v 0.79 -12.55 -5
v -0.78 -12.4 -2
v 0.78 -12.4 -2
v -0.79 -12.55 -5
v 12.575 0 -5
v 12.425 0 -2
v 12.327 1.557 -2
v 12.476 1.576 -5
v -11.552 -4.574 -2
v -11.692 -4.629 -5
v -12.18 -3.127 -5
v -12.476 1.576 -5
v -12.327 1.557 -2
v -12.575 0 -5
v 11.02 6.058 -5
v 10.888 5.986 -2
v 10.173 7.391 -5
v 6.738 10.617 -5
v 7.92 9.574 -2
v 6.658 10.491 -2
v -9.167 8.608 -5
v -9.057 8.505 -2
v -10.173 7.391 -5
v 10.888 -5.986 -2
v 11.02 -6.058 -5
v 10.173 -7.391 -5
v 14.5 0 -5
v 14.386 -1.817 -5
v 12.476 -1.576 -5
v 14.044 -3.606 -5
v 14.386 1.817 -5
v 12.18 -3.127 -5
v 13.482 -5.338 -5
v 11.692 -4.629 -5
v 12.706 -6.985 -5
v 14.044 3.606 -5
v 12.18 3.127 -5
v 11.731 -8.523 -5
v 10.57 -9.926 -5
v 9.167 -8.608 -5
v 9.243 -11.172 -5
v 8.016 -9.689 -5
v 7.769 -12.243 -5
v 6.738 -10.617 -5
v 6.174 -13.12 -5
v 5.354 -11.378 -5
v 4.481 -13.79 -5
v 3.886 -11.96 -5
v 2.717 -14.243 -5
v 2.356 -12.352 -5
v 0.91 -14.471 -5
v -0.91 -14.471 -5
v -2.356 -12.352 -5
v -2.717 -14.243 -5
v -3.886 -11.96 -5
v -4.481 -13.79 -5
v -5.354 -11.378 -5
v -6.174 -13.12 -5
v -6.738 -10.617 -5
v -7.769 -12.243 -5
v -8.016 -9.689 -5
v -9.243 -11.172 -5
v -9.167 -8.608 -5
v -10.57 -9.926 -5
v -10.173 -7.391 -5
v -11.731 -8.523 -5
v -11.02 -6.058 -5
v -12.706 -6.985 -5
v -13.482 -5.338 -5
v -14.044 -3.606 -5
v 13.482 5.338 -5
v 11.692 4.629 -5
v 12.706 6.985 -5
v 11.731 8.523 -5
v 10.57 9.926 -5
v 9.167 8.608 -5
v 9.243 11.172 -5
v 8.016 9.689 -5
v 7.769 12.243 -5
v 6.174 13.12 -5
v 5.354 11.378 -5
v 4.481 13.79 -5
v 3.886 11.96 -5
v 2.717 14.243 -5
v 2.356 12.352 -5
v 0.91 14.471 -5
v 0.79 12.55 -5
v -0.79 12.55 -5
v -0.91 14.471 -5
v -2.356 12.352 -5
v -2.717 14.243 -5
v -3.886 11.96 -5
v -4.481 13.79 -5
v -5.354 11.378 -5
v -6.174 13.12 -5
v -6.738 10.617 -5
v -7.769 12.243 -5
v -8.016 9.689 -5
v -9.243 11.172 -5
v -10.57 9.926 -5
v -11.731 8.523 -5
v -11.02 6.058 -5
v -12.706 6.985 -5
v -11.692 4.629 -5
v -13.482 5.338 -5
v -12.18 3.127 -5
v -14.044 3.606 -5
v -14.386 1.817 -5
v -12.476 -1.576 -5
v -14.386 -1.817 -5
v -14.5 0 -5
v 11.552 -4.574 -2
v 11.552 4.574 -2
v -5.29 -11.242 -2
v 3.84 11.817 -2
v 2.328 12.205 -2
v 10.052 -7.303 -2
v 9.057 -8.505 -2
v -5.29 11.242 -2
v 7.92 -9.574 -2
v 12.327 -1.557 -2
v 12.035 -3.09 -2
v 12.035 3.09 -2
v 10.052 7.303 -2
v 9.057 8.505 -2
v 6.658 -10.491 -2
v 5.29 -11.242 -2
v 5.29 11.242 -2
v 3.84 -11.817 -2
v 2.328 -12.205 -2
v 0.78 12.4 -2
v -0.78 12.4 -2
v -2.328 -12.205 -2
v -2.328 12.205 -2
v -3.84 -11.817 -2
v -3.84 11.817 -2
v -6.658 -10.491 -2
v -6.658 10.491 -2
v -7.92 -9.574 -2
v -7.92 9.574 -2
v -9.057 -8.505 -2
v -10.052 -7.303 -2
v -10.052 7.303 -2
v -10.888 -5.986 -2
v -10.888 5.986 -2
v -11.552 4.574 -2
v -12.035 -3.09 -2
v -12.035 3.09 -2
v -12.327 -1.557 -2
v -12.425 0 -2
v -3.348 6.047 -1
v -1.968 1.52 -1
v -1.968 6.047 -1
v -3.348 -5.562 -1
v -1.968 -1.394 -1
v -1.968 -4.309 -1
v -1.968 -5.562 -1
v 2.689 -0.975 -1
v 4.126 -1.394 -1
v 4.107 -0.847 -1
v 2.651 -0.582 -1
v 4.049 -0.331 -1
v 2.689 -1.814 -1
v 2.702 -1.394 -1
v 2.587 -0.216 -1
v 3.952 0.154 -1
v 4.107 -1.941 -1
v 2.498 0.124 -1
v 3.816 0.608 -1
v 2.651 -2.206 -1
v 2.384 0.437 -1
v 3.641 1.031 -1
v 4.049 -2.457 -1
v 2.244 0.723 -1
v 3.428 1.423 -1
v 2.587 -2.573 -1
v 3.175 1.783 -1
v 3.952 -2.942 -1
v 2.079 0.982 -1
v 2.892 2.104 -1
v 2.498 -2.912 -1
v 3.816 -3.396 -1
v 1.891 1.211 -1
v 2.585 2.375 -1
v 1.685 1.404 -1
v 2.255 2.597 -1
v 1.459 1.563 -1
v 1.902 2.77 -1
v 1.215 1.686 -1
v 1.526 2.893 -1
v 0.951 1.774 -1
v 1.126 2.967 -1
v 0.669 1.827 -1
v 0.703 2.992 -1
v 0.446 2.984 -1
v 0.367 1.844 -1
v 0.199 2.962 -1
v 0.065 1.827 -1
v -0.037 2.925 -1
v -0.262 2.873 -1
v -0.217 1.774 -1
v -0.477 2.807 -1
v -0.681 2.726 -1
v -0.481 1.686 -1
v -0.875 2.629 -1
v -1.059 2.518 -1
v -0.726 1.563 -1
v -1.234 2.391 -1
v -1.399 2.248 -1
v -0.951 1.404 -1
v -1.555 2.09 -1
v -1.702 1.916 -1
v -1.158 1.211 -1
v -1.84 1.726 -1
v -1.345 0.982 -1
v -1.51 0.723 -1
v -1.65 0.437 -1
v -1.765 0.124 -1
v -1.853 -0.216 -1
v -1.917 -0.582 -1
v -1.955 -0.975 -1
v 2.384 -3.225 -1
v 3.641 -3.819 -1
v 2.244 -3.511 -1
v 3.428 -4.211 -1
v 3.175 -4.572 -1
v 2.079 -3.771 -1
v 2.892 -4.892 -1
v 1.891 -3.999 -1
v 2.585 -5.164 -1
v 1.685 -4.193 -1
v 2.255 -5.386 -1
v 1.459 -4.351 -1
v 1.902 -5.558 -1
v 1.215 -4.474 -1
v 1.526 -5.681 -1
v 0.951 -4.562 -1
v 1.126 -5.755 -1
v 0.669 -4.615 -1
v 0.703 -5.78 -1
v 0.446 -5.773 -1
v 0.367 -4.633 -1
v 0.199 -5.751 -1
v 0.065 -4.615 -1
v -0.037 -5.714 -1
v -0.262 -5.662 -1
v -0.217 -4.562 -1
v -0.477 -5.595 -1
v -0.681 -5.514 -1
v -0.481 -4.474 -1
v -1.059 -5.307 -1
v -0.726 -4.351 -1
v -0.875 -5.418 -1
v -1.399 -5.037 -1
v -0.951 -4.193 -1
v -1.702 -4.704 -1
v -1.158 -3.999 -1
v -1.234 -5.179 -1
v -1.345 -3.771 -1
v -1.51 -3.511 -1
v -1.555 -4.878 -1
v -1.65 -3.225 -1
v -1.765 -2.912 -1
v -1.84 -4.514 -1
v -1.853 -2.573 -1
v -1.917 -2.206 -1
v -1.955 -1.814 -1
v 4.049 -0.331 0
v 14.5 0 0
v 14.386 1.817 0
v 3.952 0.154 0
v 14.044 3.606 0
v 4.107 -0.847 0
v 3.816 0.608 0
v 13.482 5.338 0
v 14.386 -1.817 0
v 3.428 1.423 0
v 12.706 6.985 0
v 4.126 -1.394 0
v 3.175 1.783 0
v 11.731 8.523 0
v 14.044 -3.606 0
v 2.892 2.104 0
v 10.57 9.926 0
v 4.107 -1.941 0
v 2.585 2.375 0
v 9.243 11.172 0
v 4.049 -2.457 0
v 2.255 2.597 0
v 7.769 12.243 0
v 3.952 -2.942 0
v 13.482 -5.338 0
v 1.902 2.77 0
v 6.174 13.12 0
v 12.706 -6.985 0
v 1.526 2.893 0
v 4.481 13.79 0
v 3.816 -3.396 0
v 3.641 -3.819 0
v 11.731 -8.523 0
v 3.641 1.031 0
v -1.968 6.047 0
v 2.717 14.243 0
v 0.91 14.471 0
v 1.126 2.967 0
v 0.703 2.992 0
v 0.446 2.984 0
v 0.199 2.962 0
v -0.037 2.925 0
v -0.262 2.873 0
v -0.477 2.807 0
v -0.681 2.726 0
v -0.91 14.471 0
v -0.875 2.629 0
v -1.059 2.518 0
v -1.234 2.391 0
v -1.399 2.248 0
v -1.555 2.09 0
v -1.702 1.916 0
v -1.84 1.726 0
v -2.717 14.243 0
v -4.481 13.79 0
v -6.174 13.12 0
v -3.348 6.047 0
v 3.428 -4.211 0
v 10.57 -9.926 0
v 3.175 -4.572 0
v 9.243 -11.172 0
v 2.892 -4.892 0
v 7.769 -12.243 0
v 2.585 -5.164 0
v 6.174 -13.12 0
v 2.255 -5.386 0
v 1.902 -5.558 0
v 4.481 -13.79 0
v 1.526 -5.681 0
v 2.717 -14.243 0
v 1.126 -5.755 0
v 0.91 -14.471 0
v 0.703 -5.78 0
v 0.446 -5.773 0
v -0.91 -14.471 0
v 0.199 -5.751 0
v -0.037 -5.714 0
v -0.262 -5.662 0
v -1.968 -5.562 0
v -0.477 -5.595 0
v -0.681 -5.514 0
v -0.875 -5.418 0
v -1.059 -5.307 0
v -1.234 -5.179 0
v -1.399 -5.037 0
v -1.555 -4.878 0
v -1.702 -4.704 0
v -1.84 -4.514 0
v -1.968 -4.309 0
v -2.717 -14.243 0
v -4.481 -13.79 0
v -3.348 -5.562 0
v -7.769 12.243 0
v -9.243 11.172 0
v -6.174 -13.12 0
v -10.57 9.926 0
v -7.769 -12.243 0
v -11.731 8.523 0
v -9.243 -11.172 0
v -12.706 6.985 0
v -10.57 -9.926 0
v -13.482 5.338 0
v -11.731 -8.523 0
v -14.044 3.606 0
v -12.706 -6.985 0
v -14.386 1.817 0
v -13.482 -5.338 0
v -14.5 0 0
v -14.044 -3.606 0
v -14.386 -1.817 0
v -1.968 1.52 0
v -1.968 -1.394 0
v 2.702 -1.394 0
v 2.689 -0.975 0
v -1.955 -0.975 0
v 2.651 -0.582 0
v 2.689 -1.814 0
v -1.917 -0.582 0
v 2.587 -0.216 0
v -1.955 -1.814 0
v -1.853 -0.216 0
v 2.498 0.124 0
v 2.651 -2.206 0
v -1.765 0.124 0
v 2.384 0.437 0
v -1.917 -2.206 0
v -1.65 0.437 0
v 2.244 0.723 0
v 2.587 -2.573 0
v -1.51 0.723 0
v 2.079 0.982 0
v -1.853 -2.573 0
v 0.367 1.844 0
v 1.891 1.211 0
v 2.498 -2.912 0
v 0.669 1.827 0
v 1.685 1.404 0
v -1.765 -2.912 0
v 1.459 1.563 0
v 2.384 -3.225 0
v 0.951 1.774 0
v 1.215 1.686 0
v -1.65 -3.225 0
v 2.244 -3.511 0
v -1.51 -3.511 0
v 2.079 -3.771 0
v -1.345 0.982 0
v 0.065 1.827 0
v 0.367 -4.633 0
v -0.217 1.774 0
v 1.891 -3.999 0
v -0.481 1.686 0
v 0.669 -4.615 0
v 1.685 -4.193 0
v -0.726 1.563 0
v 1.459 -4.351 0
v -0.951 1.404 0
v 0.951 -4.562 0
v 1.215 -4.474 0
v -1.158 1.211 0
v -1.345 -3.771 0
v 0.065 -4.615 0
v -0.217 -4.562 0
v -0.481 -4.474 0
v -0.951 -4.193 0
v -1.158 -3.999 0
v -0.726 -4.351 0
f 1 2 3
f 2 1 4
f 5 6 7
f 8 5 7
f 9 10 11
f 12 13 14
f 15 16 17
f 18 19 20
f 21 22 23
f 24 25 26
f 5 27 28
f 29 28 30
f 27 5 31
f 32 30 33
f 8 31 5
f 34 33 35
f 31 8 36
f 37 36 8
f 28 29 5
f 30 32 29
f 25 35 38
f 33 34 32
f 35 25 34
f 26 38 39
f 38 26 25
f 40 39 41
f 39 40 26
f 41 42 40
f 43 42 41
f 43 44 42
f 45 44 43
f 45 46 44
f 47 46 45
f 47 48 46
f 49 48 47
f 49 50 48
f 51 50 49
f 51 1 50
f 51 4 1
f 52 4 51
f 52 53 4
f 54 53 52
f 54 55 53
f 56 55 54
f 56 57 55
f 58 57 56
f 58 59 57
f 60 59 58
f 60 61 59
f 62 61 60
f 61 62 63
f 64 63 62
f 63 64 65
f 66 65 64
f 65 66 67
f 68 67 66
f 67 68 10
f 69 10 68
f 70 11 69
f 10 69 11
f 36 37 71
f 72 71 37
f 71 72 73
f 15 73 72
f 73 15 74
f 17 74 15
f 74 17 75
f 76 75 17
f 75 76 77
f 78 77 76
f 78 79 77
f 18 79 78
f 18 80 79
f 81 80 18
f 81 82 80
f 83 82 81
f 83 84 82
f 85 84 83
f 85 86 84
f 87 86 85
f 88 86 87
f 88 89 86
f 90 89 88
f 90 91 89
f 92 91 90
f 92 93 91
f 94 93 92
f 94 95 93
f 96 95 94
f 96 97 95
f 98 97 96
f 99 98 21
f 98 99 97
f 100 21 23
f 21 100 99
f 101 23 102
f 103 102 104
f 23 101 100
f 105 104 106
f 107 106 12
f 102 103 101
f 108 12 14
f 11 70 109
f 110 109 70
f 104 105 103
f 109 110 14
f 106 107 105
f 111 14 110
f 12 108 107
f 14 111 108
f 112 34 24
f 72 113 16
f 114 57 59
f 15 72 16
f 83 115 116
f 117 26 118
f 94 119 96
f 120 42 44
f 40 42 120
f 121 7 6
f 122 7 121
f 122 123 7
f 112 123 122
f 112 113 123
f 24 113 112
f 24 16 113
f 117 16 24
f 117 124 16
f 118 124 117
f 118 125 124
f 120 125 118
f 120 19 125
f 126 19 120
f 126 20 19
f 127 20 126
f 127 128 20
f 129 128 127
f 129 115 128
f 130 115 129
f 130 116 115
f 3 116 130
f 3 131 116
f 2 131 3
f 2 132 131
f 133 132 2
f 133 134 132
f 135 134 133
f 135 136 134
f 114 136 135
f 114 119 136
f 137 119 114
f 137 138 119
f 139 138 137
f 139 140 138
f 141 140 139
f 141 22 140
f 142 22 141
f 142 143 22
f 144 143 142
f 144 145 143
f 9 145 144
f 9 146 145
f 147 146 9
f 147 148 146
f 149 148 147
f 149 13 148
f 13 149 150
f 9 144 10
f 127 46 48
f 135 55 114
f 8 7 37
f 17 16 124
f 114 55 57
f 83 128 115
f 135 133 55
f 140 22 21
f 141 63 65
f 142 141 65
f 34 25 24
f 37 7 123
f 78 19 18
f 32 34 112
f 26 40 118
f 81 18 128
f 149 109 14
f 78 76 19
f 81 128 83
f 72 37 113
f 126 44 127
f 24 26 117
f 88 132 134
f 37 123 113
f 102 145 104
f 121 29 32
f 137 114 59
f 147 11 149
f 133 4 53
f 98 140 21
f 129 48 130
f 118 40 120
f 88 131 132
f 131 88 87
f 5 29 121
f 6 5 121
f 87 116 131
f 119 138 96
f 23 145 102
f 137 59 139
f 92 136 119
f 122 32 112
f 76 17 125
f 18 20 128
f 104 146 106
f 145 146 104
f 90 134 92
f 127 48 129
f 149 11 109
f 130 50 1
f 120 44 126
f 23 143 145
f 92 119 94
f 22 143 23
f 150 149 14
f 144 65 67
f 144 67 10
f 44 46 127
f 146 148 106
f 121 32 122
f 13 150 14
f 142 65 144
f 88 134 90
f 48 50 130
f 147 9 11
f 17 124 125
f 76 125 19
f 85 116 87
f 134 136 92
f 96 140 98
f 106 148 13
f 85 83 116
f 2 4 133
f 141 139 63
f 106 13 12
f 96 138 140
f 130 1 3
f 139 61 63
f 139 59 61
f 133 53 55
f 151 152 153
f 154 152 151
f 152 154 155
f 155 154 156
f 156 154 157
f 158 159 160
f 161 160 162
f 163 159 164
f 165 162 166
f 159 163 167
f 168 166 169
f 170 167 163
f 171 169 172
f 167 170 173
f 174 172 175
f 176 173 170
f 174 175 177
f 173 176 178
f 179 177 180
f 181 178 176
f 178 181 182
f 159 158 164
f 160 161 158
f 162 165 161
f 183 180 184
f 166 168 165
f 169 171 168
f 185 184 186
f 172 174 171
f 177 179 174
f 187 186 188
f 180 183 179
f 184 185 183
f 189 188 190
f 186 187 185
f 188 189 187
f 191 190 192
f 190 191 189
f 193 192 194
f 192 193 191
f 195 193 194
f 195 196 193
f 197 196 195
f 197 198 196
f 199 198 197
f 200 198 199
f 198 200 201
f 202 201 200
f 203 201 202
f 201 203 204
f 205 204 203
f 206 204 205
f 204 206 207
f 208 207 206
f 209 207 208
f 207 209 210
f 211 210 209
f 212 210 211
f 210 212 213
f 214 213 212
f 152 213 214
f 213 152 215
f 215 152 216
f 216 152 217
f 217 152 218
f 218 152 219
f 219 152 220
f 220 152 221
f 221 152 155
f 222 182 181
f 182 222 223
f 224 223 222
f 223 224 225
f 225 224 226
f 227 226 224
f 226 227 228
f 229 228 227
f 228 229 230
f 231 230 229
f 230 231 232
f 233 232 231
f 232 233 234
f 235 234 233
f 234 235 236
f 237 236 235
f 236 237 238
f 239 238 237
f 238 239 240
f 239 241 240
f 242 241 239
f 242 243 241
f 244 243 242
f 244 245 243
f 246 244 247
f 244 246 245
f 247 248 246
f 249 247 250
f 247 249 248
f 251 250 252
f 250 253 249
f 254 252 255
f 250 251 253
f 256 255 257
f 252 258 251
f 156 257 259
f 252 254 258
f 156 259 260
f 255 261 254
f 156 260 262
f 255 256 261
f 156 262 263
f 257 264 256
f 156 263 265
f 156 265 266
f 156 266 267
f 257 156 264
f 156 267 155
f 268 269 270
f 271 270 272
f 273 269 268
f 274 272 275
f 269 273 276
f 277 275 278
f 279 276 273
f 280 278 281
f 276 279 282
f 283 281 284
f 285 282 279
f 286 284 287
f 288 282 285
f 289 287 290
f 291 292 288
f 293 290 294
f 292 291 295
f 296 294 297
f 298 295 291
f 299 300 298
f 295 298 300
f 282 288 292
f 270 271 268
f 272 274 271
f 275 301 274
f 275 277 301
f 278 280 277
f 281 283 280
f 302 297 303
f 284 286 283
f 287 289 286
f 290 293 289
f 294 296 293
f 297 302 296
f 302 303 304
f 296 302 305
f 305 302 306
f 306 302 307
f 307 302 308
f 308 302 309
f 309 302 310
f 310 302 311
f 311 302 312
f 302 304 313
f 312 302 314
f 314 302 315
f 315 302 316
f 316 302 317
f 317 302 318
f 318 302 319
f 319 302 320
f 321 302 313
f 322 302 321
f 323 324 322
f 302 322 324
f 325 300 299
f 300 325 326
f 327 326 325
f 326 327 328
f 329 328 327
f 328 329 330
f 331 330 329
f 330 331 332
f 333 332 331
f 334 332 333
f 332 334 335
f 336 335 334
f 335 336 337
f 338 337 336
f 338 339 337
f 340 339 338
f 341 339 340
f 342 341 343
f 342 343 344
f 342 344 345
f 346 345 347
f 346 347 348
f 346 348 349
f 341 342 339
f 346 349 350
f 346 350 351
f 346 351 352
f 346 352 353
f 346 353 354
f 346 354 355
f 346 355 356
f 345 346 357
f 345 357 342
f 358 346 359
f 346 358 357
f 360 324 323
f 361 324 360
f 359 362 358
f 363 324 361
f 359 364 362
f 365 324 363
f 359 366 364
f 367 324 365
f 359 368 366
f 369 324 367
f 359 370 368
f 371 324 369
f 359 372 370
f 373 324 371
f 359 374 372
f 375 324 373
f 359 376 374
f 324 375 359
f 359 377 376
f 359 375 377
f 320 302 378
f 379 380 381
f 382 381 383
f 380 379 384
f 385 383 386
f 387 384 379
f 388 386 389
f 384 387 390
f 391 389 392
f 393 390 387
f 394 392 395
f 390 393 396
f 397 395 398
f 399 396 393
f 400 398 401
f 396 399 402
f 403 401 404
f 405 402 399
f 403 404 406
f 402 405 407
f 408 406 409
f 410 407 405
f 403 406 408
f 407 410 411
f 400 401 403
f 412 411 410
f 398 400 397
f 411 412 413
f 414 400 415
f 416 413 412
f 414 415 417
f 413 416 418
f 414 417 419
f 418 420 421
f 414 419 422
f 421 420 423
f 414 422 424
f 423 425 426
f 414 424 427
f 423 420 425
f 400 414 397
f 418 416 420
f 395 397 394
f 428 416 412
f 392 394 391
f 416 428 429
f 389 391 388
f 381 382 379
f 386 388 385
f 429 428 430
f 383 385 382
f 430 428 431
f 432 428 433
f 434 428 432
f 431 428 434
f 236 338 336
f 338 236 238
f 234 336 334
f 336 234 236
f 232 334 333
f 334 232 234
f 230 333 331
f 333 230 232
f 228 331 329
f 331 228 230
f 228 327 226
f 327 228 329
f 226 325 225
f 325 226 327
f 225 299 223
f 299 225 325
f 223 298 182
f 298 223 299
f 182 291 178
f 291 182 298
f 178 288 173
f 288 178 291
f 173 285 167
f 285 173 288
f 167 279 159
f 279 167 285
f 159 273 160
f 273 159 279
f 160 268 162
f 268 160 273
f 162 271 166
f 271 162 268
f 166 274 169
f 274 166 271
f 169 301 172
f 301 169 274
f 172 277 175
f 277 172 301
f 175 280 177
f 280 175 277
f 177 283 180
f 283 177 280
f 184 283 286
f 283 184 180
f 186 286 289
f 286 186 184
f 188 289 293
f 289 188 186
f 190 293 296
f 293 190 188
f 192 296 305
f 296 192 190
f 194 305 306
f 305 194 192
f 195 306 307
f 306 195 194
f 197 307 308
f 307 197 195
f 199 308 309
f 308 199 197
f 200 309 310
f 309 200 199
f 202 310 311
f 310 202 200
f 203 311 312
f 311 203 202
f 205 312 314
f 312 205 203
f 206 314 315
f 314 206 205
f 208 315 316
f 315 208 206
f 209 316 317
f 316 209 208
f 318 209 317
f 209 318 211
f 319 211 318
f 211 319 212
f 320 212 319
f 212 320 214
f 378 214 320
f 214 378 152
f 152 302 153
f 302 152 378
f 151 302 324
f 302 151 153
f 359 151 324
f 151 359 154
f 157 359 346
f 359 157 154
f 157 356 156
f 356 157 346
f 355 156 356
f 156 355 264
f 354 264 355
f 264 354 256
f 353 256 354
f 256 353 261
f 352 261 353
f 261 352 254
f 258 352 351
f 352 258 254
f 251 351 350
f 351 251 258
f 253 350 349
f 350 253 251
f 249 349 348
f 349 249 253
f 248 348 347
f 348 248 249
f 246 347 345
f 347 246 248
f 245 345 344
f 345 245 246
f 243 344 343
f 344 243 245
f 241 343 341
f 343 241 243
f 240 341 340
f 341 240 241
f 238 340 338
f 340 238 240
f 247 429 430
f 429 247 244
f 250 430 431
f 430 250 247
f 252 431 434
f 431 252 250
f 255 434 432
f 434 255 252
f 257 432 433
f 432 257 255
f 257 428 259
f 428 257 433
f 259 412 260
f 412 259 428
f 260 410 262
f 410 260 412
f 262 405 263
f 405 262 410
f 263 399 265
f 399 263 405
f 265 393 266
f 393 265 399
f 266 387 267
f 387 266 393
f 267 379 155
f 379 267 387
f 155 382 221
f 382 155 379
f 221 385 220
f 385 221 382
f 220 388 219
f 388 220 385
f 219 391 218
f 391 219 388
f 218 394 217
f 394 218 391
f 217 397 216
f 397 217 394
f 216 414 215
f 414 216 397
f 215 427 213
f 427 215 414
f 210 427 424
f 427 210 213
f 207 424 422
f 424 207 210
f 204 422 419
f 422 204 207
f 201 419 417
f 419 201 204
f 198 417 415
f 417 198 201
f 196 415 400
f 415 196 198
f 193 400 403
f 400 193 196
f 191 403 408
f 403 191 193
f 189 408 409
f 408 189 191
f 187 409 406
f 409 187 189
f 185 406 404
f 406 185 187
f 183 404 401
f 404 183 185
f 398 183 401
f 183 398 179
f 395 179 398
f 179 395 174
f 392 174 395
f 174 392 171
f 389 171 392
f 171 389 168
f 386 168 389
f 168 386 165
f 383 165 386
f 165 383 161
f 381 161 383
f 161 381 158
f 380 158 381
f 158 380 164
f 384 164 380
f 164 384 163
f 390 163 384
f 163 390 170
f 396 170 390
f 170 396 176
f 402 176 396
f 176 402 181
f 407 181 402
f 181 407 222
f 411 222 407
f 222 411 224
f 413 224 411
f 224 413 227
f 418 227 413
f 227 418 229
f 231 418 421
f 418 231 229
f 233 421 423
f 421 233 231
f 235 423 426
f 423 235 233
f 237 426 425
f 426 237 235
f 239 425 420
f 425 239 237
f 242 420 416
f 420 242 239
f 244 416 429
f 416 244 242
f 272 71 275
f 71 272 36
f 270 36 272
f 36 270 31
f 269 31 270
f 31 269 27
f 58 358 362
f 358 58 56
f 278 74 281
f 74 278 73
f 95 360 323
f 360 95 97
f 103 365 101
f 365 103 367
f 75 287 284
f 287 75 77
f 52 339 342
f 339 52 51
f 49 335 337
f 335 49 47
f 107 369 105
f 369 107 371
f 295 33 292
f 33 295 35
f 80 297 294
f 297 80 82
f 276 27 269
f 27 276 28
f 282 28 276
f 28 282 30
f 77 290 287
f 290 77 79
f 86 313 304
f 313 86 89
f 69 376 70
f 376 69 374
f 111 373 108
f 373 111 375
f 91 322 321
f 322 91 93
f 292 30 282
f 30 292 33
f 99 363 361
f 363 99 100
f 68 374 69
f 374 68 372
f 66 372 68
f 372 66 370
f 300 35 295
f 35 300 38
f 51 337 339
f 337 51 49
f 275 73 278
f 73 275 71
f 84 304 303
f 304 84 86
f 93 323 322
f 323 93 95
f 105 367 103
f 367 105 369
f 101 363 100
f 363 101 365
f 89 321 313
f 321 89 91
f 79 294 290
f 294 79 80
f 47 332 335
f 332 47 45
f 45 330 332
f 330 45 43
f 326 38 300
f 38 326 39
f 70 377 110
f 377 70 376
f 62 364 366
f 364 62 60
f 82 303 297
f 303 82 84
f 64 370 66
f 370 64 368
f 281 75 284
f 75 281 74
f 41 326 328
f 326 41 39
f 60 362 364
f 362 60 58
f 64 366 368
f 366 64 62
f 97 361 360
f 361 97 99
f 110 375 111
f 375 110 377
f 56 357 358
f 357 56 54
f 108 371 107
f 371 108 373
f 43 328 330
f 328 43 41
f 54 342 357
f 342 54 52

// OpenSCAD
$fn = 50;


difference() {
	union() {
		translate(v = [0, 0, -5.0000000000]) {
			cylinder(h = 5, r = 14.5000000000);
		}
	}
	union() {
		#translate(v = [0, 0, -5.0000000000]) {
			cylinder(h = 3, r1 = 12.5750000000, r2 = 12.4250000000);
		}
		translate(v = [0, 0, -1]) {
			linear_extrude(height = 1) {
				text(font = "Webdings", halign = "center", size = 11, text = "b", valign = "center");
			}
		}
	}
}
